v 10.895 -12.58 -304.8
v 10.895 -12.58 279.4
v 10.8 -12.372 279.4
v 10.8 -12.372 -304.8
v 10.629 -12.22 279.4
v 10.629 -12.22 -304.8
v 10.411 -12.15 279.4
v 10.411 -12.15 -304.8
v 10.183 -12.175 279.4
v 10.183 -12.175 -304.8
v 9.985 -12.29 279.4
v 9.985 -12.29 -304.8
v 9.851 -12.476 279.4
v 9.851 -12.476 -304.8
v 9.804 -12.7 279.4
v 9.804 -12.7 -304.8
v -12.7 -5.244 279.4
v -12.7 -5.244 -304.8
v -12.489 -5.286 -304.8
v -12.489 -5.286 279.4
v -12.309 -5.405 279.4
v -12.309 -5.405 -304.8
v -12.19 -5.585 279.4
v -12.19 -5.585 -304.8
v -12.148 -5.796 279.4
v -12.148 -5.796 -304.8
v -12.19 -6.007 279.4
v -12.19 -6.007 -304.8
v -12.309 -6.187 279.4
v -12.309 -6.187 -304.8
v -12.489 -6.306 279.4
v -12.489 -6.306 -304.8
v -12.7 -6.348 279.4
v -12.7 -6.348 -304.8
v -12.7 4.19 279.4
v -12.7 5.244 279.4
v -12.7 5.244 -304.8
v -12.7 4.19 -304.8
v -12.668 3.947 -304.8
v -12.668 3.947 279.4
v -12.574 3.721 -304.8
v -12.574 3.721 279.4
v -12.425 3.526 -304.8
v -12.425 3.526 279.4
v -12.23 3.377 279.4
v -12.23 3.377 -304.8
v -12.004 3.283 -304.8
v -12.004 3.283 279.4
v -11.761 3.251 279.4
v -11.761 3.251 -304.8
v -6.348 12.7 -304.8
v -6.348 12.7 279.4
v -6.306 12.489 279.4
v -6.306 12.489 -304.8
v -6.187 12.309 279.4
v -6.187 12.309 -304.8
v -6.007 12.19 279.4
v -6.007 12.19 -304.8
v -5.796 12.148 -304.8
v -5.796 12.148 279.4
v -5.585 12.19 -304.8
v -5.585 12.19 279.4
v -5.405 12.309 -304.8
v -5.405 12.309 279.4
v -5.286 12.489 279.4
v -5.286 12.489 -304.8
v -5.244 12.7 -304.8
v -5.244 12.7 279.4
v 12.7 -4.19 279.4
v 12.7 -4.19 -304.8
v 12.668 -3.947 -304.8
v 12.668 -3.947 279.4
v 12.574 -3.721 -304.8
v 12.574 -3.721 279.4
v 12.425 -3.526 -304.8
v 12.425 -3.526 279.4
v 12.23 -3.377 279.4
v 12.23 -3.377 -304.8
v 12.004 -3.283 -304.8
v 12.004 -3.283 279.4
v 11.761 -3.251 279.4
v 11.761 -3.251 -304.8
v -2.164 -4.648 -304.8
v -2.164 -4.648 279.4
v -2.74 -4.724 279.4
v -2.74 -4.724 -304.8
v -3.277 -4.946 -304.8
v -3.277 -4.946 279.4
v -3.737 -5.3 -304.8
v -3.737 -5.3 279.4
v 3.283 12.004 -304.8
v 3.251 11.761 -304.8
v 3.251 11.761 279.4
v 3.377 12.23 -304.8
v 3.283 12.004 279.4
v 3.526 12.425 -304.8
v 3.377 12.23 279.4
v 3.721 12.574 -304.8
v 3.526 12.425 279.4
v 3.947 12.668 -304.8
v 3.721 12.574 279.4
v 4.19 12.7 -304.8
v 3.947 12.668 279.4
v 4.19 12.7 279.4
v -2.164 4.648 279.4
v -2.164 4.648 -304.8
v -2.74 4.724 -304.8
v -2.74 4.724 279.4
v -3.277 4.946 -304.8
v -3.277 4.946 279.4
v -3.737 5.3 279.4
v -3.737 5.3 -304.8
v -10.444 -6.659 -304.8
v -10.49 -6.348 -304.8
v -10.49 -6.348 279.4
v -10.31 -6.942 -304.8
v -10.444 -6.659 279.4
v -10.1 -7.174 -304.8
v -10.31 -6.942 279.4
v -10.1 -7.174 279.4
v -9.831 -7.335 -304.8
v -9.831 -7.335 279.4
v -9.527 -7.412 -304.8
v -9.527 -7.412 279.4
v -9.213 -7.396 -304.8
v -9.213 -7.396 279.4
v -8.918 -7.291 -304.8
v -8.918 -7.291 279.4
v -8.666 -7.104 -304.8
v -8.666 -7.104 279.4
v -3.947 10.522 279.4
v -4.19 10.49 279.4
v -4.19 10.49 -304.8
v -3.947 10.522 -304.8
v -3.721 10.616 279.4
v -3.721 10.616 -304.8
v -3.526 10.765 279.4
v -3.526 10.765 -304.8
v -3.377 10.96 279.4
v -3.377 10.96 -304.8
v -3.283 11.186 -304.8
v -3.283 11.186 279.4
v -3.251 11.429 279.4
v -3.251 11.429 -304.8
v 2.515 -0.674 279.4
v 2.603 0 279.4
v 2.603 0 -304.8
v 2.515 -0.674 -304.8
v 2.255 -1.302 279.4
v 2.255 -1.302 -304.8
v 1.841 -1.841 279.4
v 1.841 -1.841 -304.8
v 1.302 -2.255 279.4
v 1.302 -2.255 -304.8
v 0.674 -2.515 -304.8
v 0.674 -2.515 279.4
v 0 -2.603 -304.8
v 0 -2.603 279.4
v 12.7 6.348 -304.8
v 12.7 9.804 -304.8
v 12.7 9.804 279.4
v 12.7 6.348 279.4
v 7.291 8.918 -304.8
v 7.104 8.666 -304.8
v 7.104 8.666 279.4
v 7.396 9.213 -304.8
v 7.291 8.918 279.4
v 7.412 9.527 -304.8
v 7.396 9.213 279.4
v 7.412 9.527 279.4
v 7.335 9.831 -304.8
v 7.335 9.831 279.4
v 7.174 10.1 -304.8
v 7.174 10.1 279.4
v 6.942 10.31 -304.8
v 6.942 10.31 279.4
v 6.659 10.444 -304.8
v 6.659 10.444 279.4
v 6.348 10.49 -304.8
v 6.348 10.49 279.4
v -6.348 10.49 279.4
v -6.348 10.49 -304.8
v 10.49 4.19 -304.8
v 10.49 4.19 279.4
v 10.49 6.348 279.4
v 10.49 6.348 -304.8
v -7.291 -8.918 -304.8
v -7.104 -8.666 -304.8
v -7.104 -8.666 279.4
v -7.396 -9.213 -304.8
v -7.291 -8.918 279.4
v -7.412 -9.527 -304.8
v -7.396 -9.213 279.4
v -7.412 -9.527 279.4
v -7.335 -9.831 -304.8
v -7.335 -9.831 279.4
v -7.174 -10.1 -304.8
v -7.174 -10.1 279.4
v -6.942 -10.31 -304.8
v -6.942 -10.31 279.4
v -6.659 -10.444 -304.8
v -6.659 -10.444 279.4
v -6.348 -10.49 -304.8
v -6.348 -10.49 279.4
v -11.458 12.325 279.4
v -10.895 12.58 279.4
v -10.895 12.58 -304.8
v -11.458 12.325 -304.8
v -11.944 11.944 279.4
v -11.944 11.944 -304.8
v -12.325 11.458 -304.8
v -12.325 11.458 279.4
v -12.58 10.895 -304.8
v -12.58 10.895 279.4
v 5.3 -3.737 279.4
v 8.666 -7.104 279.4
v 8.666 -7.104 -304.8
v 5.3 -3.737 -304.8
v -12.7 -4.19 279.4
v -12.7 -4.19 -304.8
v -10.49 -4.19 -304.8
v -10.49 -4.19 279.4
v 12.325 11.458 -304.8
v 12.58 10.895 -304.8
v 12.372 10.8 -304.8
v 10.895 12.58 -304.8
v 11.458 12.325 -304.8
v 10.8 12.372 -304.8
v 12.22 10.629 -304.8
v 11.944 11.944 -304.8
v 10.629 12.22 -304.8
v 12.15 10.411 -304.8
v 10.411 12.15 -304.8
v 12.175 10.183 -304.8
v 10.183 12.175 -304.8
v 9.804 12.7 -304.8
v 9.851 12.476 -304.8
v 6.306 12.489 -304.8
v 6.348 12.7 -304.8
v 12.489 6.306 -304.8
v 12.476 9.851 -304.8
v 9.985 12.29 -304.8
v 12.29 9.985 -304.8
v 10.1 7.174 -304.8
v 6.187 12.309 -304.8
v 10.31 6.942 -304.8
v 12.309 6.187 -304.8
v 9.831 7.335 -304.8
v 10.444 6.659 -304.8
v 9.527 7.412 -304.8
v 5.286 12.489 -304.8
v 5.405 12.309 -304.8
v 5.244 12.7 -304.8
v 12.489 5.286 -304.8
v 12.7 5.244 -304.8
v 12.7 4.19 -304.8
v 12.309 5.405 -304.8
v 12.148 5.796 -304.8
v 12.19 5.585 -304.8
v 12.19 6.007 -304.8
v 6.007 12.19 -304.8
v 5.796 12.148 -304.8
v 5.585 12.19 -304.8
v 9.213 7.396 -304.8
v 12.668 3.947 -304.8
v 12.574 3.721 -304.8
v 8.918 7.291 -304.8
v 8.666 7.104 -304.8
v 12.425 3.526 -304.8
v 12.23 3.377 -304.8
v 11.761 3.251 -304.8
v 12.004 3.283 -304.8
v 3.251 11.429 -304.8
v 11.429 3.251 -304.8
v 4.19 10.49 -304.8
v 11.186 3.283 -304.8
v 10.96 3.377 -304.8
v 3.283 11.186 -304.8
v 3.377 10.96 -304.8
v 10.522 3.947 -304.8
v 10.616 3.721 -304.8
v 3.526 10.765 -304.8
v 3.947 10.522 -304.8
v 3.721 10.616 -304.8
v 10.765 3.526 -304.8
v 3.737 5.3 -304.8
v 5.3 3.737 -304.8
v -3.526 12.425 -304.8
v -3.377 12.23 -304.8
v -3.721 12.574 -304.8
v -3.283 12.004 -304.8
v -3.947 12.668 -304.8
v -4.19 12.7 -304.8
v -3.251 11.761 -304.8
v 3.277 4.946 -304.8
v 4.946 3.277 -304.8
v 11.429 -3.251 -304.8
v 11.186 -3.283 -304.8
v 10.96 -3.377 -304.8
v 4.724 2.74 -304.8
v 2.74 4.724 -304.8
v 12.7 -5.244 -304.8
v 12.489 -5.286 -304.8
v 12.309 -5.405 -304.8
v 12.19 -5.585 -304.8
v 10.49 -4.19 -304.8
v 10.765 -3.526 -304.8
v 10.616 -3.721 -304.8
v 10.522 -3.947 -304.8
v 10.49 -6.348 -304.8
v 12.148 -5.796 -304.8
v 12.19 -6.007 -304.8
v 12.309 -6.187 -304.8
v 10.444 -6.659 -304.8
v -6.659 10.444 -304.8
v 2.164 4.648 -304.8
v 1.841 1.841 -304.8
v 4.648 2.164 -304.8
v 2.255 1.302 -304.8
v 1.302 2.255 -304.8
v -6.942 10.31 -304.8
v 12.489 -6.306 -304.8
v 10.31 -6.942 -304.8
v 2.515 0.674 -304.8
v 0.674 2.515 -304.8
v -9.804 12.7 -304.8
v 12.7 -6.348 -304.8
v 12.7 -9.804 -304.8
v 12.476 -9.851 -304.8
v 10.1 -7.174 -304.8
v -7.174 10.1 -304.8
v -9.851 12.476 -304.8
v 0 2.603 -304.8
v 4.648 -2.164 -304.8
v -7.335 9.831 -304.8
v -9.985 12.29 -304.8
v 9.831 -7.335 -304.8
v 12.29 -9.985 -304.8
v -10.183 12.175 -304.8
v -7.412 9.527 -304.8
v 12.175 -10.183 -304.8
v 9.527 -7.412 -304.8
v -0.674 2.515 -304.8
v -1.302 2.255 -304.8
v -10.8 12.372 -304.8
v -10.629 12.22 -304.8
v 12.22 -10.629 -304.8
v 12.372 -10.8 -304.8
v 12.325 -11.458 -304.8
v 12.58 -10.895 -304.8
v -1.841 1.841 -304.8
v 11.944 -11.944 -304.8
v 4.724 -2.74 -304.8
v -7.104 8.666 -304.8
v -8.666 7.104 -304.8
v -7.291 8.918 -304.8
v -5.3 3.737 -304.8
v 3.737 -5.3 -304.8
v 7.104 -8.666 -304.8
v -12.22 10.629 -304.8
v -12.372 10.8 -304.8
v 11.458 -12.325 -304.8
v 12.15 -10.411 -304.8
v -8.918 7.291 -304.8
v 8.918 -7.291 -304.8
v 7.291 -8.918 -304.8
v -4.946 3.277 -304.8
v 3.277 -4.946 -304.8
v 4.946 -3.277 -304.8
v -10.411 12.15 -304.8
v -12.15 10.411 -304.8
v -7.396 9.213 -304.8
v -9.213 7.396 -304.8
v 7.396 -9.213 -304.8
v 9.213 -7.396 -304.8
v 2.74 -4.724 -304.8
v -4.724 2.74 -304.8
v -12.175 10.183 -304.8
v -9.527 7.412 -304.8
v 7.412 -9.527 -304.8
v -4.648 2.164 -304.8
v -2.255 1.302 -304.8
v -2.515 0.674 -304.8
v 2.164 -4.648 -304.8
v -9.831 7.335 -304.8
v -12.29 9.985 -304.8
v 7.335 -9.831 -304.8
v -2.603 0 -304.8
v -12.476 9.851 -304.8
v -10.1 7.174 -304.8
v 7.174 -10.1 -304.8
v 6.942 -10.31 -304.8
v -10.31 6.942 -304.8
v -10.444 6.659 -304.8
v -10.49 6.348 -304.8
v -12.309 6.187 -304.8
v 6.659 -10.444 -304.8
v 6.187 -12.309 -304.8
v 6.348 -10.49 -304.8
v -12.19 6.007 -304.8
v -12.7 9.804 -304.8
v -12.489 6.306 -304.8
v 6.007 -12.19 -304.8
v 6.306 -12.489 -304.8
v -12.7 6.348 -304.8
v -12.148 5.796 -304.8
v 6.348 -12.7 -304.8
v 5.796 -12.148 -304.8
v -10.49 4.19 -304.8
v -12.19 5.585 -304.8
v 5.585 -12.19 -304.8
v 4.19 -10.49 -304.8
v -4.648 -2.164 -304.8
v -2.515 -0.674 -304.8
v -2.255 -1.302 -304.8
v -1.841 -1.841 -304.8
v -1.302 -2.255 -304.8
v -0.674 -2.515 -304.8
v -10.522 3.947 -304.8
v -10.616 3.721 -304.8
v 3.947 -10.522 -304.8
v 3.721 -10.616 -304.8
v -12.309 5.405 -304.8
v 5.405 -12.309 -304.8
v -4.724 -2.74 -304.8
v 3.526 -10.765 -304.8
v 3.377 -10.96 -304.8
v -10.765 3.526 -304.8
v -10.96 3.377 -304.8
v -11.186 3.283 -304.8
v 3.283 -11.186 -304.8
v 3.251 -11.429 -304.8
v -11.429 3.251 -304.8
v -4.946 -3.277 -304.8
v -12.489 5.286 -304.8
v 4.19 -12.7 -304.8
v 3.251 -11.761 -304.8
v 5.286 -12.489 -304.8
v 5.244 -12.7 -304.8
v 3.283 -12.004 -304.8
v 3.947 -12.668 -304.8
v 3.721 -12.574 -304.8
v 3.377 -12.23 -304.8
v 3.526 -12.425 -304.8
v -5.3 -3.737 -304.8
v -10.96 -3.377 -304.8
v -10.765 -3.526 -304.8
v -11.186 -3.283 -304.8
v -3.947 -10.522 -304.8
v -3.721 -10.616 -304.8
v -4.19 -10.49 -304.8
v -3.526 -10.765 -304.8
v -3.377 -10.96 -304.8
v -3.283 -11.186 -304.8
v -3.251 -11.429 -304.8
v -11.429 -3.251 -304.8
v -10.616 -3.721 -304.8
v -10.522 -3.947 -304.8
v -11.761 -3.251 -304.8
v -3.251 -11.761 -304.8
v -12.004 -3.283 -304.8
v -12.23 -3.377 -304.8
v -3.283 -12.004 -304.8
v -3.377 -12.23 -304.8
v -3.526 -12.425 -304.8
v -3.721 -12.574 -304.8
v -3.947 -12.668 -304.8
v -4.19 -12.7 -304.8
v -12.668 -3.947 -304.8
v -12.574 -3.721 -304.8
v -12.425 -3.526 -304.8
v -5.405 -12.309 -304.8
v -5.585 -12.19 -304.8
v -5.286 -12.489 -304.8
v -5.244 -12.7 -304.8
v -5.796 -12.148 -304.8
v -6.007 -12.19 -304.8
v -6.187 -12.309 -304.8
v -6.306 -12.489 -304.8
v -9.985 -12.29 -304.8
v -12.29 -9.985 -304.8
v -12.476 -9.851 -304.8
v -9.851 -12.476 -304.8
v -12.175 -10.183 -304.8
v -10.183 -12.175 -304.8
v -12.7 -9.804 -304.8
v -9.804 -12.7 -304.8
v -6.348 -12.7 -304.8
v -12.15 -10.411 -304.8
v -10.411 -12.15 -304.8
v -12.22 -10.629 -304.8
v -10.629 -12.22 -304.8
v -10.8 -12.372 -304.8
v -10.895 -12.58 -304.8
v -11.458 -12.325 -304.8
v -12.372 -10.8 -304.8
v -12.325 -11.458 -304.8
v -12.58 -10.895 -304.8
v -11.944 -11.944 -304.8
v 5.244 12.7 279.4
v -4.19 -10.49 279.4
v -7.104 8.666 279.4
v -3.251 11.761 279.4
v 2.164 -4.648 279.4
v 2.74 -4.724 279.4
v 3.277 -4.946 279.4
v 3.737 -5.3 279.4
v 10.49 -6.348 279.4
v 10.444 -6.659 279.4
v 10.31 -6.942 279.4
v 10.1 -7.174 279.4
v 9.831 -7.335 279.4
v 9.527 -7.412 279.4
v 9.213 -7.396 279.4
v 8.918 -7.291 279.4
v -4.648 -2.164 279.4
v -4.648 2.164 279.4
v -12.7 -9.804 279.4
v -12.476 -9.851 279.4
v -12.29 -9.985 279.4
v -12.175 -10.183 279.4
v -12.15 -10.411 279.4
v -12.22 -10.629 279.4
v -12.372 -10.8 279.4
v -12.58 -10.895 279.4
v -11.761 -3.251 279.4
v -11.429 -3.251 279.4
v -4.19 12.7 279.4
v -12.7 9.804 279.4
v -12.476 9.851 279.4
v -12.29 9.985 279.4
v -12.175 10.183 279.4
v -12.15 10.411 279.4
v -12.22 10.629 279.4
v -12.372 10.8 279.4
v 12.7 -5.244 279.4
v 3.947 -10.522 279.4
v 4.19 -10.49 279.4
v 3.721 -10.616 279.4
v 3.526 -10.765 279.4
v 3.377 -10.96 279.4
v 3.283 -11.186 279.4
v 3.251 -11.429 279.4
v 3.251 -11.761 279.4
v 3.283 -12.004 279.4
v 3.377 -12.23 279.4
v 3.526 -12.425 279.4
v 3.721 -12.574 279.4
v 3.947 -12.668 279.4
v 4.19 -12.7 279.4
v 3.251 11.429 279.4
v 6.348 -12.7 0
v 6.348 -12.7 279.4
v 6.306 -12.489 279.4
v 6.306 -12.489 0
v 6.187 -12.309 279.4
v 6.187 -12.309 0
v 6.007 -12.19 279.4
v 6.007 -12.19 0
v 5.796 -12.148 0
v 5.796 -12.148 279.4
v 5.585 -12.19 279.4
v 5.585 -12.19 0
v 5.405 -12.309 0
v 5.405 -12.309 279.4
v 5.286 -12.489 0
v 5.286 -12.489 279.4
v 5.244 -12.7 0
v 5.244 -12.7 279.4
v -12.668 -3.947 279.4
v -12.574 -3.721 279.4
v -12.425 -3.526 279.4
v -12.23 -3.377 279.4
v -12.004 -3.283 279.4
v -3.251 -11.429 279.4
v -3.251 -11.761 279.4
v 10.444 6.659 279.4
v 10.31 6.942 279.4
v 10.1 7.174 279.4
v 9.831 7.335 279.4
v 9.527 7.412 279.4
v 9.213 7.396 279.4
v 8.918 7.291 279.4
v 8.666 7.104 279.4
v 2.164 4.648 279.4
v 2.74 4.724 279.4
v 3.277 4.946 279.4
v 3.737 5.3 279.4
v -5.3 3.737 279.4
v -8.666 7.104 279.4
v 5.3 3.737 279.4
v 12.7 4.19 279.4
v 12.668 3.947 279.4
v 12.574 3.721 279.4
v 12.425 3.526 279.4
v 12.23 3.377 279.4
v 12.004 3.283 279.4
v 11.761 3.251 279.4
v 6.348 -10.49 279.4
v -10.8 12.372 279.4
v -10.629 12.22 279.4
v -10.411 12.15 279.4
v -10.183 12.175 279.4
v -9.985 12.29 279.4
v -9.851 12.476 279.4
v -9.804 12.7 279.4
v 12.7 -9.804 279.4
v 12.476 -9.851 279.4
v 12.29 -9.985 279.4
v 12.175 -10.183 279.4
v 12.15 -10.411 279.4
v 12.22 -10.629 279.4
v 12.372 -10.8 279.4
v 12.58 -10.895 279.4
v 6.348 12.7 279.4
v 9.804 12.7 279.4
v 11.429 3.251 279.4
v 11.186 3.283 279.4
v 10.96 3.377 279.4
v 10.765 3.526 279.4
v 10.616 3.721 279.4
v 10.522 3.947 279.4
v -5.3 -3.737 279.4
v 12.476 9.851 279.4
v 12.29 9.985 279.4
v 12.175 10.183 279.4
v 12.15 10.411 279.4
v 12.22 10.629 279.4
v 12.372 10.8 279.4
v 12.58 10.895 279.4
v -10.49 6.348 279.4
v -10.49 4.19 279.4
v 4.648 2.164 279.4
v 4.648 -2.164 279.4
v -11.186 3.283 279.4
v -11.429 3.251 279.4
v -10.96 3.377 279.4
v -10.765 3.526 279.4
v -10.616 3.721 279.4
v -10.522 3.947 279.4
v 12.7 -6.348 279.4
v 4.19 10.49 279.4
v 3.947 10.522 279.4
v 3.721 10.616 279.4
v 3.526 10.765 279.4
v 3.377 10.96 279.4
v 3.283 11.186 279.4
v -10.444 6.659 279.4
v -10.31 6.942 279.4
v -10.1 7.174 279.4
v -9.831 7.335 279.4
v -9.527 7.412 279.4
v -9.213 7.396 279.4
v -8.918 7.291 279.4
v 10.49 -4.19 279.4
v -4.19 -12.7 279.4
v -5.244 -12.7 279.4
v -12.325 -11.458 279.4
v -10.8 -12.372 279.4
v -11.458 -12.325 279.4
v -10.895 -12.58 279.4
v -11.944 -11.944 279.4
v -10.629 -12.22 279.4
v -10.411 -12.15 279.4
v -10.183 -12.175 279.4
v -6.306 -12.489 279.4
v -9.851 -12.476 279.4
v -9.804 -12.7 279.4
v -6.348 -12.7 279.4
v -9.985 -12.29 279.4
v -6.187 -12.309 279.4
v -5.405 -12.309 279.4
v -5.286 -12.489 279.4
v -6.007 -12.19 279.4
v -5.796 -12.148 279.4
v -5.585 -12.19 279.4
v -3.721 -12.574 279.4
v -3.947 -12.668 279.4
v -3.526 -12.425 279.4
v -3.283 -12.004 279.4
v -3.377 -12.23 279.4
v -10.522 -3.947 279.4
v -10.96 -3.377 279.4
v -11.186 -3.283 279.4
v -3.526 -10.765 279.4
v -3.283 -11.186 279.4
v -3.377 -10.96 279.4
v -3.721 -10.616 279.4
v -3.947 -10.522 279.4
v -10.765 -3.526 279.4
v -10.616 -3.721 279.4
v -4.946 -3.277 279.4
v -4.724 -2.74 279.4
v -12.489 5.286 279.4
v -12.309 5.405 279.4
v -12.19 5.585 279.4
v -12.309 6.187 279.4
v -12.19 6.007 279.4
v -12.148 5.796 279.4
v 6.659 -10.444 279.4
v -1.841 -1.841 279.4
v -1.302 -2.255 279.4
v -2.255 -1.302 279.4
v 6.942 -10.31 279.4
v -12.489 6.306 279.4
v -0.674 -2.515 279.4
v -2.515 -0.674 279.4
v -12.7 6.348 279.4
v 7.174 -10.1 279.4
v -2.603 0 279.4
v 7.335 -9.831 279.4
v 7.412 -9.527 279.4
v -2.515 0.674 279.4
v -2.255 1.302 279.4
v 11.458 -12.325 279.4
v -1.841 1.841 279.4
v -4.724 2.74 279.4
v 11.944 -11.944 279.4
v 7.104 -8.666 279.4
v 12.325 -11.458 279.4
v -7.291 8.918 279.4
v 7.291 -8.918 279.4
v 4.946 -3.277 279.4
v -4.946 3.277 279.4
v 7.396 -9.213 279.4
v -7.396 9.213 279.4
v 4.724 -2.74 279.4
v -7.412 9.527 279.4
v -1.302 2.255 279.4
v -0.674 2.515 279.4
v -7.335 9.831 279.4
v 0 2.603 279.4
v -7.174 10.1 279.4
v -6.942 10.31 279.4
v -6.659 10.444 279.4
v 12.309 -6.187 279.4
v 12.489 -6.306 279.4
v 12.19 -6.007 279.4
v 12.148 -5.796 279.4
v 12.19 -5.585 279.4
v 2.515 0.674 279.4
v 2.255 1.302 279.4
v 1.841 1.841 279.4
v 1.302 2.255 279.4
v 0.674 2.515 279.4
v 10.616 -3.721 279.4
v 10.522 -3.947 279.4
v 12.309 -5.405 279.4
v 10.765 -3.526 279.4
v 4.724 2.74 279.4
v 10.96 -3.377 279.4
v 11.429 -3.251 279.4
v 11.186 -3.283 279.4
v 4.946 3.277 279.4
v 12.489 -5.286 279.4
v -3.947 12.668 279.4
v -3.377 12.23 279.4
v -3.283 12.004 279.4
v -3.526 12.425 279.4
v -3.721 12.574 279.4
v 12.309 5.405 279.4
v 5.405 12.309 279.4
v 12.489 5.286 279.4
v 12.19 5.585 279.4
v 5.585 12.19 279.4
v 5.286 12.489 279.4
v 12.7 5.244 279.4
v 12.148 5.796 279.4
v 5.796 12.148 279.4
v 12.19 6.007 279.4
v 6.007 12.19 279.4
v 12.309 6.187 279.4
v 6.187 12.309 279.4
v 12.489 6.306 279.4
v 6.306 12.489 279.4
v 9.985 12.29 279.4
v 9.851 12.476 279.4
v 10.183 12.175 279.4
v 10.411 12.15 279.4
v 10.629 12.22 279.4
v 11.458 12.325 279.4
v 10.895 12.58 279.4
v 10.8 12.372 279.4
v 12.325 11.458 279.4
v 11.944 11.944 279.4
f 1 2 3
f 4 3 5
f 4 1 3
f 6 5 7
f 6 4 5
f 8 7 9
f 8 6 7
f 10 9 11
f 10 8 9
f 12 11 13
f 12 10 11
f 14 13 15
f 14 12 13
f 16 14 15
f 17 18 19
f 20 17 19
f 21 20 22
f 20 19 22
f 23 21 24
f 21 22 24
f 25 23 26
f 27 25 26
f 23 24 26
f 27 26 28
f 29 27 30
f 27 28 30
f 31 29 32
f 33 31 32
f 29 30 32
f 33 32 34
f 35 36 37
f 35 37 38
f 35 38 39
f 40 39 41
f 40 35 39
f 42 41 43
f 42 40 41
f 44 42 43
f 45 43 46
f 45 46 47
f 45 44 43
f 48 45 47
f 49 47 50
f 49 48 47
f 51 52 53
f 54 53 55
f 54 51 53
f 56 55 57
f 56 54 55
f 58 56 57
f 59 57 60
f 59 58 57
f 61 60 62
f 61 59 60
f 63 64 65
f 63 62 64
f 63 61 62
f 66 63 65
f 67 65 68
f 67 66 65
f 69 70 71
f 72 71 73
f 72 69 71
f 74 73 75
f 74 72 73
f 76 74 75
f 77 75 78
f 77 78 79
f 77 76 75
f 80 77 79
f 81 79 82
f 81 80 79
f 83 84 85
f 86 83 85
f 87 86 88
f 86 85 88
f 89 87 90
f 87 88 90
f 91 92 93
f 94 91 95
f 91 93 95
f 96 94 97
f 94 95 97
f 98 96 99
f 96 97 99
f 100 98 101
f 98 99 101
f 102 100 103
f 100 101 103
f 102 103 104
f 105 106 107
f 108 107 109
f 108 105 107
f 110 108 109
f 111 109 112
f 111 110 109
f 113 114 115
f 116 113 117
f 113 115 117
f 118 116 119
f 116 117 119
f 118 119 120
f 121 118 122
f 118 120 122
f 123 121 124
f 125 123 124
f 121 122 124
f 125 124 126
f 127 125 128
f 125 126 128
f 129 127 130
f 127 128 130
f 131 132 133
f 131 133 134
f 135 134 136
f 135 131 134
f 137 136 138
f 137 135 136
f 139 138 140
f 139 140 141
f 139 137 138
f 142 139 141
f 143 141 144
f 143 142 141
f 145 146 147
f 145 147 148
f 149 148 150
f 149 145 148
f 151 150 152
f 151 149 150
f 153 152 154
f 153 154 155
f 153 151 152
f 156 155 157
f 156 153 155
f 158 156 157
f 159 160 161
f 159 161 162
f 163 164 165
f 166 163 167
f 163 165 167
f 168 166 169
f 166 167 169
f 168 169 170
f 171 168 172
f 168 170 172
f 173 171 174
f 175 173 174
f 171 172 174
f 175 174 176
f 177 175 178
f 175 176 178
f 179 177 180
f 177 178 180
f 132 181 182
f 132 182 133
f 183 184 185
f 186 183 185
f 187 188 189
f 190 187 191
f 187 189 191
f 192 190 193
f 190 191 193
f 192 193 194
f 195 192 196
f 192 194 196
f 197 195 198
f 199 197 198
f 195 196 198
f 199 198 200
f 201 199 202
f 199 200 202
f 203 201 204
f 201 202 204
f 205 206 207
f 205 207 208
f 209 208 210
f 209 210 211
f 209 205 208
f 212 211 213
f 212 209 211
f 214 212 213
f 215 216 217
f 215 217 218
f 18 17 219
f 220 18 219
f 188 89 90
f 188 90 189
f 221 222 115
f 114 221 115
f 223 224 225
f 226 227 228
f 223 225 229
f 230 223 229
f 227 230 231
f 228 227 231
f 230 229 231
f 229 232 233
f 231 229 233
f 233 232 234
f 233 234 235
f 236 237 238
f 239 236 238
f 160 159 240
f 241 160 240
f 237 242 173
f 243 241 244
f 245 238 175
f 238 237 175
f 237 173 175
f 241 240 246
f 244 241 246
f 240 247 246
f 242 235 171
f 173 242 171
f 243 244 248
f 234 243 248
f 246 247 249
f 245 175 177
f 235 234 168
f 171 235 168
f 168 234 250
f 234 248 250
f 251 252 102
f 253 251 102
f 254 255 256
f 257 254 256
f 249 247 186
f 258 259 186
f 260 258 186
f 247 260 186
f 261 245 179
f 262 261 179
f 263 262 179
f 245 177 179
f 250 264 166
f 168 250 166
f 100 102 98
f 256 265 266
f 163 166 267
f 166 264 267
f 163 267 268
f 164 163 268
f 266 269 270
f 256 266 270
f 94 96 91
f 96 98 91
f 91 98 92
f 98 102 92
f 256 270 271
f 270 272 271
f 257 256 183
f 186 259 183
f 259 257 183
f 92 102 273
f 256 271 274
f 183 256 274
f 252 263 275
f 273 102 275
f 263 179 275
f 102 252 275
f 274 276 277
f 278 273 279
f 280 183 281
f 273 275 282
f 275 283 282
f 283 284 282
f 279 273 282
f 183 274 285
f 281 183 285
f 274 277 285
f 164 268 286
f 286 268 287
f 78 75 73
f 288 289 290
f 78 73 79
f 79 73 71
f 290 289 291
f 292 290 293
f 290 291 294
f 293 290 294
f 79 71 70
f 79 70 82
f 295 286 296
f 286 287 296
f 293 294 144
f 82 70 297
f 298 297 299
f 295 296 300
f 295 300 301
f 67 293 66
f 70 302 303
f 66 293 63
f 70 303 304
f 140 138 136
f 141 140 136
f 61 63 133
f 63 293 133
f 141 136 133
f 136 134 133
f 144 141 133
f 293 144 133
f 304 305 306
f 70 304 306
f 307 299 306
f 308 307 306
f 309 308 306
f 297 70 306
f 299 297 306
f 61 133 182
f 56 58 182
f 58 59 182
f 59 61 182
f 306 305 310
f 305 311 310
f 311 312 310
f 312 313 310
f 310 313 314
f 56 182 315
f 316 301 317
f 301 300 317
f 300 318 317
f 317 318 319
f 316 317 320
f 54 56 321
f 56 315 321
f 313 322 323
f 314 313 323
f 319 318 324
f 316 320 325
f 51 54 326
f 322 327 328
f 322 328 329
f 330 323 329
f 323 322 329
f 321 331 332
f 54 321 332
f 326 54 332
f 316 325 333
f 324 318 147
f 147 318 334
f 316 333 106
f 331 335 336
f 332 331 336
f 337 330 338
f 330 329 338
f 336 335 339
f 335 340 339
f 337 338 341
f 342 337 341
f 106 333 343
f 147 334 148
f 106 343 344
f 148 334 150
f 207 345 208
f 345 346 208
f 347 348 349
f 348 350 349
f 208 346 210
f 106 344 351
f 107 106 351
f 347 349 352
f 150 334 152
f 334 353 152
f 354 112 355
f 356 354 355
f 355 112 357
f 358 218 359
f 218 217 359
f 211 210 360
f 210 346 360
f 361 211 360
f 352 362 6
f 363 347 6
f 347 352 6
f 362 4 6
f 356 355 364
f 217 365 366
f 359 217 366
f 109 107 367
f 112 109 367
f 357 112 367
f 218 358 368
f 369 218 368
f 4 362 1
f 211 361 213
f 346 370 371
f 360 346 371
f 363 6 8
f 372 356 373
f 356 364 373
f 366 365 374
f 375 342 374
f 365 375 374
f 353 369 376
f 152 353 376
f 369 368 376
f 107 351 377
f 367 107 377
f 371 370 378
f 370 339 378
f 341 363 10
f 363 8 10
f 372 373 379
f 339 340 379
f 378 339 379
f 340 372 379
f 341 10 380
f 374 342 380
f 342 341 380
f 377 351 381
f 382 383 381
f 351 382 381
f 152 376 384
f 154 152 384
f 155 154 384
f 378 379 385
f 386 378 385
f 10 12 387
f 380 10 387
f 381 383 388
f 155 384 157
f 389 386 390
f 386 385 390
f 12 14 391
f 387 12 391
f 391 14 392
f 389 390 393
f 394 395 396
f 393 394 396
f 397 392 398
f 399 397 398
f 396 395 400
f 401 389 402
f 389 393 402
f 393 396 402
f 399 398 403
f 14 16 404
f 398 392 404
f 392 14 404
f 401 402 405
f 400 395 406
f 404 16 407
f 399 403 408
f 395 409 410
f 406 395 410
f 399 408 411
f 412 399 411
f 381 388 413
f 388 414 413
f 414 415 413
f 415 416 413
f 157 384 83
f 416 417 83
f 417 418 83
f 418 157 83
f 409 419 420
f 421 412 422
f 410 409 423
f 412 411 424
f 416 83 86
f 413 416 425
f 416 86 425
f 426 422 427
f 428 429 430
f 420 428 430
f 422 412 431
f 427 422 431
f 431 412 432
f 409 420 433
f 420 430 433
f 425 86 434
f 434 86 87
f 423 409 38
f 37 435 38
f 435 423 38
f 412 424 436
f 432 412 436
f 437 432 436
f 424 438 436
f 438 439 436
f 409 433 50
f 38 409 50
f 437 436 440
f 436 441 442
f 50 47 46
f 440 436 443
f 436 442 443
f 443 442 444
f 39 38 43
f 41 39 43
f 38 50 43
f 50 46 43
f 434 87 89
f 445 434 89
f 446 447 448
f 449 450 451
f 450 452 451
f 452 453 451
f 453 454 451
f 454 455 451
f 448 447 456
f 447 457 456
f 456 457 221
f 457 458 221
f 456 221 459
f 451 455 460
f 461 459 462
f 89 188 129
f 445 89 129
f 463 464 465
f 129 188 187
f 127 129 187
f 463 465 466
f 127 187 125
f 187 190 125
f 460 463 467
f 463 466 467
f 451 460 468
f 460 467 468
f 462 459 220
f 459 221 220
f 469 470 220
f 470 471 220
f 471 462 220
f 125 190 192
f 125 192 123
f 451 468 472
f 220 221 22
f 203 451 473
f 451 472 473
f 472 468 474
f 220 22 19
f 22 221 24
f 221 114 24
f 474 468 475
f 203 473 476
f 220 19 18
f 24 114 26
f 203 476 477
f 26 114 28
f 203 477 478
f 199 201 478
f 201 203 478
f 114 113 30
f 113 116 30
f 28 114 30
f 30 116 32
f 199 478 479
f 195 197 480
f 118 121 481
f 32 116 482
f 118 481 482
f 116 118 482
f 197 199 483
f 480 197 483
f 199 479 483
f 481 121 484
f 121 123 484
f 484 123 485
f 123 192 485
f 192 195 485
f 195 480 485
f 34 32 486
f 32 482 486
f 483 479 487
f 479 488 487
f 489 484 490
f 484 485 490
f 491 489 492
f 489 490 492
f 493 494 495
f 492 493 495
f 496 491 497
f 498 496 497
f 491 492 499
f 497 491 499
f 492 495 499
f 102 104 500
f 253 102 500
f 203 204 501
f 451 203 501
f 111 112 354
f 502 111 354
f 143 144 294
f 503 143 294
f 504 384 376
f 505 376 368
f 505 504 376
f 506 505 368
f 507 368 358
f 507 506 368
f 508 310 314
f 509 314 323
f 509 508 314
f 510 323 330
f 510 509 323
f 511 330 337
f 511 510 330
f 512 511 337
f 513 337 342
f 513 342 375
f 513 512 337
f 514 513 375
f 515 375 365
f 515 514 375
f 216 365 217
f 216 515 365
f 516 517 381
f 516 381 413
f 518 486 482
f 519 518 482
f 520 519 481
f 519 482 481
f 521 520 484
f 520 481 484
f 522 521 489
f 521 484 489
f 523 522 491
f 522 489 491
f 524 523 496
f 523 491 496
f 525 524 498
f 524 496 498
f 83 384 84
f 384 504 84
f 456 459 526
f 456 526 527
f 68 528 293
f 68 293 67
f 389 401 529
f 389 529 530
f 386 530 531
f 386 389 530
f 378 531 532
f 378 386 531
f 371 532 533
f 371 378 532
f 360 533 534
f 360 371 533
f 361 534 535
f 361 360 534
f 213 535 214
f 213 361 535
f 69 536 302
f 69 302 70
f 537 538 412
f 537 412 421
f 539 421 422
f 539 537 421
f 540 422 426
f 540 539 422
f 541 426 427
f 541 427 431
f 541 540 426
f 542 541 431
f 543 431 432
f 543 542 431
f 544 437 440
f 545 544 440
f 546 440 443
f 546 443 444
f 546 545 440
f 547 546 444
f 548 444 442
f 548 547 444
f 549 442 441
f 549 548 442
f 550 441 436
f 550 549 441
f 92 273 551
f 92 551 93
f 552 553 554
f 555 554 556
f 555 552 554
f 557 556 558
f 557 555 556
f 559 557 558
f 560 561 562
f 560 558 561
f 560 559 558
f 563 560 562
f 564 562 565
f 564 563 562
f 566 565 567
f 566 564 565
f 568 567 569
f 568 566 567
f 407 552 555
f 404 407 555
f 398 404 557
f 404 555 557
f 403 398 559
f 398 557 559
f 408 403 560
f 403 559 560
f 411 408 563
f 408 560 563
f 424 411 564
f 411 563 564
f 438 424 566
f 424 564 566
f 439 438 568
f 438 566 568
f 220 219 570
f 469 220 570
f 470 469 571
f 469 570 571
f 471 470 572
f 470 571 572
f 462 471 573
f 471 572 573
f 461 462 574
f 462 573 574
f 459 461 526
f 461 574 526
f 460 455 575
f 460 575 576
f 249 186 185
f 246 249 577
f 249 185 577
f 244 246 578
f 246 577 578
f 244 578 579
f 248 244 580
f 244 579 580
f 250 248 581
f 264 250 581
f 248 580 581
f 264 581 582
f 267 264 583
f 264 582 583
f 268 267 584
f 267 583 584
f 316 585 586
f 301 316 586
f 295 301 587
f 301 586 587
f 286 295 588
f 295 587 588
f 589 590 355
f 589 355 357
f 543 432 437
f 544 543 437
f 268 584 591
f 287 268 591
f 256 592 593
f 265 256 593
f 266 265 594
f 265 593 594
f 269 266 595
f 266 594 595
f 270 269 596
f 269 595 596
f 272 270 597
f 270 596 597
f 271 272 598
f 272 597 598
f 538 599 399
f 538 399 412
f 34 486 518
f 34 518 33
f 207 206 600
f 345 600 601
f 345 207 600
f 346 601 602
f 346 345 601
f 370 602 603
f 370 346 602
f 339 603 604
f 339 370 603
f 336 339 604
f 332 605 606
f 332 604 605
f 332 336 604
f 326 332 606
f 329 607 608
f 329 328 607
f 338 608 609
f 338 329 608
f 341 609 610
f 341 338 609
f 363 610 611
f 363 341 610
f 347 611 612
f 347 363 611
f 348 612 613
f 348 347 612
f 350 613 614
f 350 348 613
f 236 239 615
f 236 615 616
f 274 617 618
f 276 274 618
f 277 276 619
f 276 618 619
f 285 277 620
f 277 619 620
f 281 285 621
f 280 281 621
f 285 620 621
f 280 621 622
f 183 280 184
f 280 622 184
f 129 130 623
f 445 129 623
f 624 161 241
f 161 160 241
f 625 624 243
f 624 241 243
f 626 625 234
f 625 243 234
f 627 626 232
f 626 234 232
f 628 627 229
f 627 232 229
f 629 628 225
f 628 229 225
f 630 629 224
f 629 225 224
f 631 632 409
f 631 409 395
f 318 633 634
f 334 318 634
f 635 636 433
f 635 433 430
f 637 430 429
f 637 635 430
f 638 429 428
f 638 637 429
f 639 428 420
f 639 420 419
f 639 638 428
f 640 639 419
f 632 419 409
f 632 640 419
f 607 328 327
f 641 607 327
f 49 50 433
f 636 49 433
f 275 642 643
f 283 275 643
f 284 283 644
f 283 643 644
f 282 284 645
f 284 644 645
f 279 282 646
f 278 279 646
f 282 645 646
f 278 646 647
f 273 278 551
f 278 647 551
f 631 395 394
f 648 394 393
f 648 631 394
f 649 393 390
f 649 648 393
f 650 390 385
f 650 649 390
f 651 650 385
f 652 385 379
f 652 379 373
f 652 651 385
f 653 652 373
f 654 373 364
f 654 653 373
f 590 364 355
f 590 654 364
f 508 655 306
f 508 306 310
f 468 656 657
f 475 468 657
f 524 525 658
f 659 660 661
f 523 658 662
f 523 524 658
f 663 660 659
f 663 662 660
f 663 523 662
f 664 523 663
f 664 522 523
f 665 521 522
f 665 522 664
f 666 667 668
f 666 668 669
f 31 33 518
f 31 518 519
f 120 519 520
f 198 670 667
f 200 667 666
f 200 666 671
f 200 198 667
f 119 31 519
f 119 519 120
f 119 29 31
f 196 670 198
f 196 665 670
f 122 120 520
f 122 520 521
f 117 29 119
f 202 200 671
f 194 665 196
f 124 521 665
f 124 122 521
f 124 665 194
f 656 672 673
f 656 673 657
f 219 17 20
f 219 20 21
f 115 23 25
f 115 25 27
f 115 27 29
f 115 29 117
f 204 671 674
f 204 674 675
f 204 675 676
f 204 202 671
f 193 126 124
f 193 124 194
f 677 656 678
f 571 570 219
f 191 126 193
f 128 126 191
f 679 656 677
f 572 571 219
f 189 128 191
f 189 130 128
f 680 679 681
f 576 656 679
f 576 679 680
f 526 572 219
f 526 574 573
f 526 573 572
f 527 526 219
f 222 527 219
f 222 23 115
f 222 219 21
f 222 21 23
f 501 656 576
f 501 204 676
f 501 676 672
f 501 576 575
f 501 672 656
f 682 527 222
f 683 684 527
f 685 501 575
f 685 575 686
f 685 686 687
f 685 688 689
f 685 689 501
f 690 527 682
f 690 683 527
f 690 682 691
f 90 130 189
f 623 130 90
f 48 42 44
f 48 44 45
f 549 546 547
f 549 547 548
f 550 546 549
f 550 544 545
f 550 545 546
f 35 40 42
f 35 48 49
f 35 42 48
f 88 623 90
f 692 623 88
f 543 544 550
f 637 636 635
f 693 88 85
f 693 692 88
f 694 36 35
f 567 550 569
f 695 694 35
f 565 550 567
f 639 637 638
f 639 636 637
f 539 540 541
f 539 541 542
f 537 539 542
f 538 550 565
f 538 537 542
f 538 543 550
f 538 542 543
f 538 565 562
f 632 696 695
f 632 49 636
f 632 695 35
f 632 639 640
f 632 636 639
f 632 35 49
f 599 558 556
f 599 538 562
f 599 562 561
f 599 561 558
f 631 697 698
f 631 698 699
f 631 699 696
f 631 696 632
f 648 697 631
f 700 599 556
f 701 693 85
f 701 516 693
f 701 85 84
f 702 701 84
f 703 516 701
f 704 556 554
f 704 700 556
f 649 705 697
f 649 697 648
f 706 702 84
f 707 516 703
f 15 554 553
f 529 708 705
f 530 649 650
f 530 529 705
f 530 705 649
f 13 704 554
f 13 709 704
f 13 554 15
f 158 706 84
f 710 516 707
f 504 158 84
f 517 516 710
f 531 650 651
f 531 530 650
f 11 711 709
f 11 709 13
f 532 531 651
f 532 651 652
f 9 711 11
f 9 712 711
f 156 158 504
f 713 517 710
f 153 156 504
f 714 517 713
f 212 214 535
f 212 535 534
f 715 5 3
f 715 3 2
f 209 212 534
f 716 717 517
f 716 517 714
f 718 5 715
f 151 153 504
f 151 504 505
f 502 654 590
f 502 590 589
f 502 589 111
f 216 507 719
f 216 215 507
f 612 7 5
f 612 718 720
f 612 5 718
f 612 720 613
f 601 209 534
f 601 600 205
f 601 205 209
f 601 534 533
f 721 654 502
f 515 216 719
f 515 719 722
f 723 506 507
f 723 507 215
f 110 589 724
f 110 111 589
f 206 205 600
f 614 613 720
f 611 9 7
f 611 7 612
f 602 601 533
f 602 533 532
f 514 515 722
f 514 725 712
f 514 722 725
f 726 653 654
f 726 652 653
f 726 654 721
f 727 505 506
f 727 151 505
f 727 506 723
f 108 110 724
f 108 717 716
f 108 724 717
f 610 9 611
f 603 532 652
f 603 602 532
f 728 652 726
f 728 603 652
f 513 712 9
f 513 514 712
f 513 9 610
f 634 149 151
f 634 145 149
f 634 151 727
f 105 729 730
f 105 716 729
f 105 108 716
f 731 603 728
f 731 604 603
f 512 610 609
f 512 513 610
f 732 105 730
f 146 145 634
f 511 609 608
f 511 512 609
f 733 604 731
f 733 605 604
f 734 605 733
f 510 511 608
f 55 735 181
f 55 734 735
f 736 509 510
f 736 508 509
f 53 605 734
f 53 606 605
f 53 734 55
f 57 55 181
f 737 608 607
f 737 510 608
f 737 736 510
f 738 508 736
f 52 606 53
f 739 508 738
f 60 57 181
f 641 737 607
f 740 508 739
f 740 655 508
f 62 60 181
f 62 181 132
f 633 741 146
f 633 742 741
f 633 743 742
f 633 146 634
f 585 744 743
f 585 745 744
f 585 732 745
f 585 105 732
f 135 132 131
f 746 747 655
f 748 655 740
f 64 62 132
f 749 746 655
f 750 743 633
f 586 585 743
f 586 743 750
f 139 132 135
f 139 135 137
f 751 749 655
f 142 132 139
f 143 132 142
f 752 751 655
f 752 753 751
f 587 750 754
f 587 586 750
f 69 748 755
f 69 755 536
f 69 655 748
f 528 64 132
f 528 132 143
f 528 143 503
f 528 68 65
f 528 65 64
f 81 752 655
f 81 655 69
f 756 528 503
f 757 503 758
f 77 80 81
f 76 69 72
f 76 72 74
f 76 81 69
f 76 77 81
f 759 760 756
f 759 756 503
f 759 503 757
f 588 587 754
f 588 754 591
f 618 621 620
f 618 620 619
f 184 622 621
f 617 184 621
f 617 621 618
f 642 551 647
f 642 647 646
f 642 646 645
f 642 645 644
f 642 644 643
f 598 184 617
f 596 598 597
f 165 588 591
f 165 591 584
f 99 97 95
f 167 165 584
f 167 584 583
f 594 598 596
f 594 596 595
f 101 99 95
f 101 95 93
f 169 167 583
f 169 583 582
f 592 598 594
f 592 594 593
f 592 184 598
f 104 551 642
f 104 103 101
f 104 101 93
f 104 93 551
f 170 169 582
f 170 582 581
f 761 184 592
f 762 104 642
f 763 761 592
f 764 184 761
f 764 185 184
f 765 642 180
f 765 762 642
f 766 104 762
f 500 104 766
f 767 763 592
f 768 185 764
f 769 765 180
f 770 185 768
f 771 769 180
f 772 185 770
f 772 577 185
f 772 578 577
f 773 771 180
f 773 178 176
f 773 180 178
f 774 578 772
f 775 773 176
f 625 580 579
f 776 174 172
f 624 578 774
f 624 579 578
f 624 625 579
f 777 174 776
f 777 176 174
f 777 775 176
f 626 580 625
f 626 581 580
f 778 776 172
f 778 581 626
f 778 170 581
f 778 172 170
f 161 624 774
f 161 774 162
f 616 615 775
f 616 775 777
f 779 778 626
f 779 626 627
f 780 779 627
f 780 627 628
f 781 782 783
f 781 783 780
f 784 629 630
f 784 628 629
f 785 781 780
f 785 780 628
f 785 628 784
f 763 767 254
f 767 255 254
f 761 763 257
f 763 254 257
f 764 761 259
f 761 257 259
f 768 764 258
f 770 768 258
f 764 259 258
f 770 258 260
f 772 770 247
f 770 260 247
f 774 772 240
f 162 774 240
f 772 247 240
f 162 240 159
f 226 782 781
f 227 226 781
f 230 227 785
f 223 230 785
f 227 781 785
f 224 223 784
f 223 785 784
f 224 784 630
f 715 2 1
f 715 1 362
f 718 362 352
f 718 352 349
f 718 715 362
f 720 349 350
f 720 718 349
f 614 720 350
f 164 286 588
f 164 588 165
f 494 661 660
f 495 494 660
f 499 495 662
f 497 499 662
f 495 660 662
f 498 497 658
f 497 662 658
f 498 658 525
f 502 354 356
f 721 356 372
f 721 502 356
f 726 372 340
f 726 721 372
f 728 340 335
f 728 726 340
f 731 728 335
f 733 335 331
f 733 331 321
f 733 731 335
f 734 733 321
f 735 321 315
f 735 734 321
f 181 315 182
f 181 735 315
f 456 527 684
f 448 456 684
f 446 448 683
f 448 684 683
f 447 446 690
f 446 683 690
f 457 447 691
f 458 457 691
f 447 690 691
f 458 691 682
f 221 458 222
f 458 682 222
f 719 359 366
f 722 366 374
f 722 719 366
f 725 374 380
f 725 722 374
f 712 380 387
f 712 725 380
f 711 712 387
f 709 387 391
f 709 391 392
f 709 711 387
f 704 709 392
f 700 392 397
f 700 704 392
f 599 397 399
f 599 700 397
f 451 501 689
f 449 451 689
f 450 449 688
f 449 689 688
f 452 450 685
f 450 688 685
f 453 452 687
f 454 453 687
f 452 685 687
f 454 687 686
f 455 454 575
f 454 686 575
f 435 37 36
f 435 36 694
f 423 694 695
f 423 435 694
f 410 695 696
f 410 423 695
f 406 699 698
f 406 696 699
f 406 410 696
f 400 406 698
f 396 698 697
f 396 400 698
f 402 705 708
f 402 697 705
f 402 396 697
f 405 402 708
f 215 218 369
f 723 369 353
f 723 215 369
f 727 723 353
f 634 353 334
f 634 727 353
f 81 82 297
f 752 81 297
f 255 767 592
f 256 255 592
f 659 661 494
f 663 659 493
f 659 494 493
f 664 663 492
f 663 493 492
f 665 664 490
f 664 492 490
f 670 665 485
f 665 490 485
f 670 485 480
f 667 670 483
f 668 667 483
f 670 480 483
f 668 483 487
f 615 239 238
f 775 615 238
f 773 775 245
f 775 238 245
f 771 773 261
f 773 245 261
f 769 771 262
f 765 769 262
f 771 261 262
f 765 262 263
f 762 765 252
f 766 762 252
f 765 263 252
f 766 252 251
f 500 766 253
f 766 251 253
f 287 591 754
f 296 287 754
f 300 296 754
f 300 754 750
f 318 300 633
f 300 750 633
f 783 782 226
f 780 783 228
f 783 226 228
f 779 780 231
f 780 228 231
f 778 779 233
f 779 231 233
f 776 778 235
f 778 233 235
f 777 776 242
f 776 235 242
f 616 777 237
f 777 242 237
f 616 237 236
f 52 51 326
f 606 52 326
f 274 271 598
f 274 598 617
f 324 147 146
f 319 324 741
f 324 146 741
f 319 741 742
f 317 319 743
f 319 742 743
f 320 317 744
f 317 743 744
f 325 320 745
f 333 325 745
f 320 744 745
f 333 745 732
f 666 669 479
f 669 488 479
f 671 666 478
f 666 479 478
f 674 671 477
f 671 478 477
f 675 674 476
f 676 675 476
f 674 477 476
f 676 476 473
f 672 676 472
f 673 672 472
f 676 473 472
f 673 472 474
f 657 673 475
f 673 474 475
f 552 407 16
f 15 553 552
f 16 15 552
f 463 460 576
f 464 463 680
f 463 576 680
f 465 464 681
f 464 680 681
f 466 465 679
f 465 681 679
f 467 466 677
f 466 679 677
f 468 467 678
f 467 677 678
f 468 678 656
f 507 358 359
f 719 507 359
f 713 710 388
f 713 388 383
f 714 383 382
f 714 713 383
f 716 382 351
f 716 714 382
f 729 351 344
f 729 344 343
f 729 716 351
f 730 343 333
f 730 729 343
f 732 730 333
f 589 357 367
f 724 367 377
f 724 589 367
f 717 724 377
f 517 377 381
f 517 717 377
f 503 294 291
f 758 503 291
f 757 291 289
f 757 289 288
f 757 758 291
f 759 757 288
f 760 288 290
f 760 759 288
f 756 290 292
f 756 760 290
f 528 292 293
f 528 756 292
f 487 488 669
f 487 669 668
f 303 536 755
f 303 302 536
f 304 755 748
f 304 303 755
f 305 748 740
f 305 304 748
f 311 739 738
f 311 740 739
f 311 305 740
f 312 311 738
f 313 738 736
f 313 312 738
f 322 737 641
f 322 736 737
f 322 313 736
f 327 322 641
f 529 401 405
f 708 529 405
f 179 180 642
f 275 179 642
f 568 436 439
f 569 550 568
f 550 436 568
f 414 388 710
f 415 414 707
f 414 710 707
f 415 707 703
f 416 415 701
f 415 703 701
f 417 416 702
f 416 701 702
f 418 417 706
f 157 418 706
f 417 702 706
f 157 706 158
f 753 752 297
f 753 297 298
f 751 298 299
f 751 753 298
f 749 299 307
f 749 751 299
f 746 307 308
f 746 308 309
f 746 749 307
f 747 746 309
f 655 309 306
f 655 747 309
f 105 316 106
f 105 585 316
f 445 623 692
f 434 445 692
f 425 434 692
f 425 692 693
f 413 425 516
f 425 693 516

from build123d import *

# Parameters (mm, degrees)
BOSS_EXTRUDE1_DEPTH     = 304.8
SKETCH5_R               = 0.55245
CUT_EXTRUDE1_DEPTH      = 305.8
CUT_EXTRUDE1_DEPTH_BACK = 305.8
SKETCH6_W               = 31.75
SKETCH6_H               = 25.4
CUT_EXTRUDE2_DEPTH      = 12.7


with BuildPart() as part:
    # Sketch4 → Boss-Extrude1 (new body, symmetric)
    with BuildSketch(Plane.XY):
        with BuildLine():
            Line((4.190365, -12.7), (10.11729625, -12.7))
            ThreePointArc((10.11729625, -12.7), (11.943543585, -11.943543585), (12.7, -10.11729625))
            Line((12.7, -10.11729625), (12.7, -4.190365))
            ThreePointArc((12.7, -4.190365), (12.42492494, -3.52627506), (11.760835, -3.2512))
            Line((11.760835, -3.2512), (11.429365, -3.2512))
            ThreePointArc((11.429365, -3.2512), (10.76527506, -3.52627506), (10.4902, -4.190365))
            Line((10.4902, -4.190365), (10.4902, -6.348478019))
            ThreePointArc((10.4902, -6.348478019), (9.830707141, -7.335478831), (8.666460301, -7.103895736))
            Line((8.666460301, -7.103895736), (5.299899128, -3.737334563))
            ThreePointArc((5.299899128, -3.737334563), (4.817571085, -3.015479634), (4.6482, -2.16399369))
            Line((4.6482, -2.16399369), (4.6482, 0))
            Line((4.6482, 0), (2.6035, 0))
            ThreePointArc((2.6035, 0), (1.840952505, -1.840952505), (0, -2.6035))
            Line((0, -2.6035), (0, -4.6482))
            Line((0, -4.6482), (2.16399369, -4.6482))
            ThreePointArc((2.16399369, -4.6482), (3.015479634, -4.817571085), (3.737334563, -5.299899128))
            Line((3.737334563, -5.299899128), (7.103895736, -8.666460301))
            ThreePointArc((7.103895736, -8.666460301), (7.335478831, -9.830707141), (6.348478019, -10.4902))
            Line((6.348478019, -10.4902), (4.190365, -10.4902))
            ThreePointArc((4.190365, -10.4902), (3.52627506, -10.76527506), (3.2512, -11.429365))
            Line((3.2512, -11.429365), (3.2512, -11.760835))
            ThreePointArc((3.2512, -11.760835), (3.52627506, -12.42492494), (4.190365, -12.7))
        make_face()
    extrude(amount=BOSS_EXTRUDE1_DEPTH, both=True)

    # Sketch5 → Cut-Extrude1 (cut, two sides)
    with BuildSketch(Plane.XY) as cut_extrude1_sk:
        with Locations((10.356153152, -12.7)):
            Circle(SKETCH5_R)
        with Locations((5.796028019, -12.7)):
            Circle(SKETCH5_R)
        with Locations((12.7, -10.356153152)):
            Circle(SKETCH5_R)
        with Locations((12.7, -5.796028019)):
            Circle(SKETCH5_R)
    extrude(amount=CUT_EXTRUDE1_DEPTH, mode=Mode.SUBTRACT)
    extrude(cut_extrude1_sk.sketch, amount=-CUT_EXTRUDE1_DEPTH_BACK, mode=Mode.SUBTRACT)

    # Mirror1: part across plane


with BuildPart() as part_1:
    add(part.part)
    add(part.part.mirror(Plane(origin=(0, 0, 0), x_dir=(0, 0, 1), z_dir=(1, 0, 0))))

    # Mirror2: part across plane


with BuildPart() as part_2:
    add(part_1.part)
    add(part_1.part.mirror(Plane.ZX))

    # Sketch6 → Cut-Extrude2 (cut, symmetric)
    with BuildSketch(Plane(origin=(0, 0, 0), x_dir=(1, 0, 0), z_dir=(0, 1, 0))):
        with Locations((-0.060001566, -292.1)):
            Rectangle(SKETCH6_W, SKETCH6_H)
    extrude(amount=CUT_EXTRUDE2_DEPTH, both=True, mode=Mode.SUBTRACT)


solid = part_2.part
